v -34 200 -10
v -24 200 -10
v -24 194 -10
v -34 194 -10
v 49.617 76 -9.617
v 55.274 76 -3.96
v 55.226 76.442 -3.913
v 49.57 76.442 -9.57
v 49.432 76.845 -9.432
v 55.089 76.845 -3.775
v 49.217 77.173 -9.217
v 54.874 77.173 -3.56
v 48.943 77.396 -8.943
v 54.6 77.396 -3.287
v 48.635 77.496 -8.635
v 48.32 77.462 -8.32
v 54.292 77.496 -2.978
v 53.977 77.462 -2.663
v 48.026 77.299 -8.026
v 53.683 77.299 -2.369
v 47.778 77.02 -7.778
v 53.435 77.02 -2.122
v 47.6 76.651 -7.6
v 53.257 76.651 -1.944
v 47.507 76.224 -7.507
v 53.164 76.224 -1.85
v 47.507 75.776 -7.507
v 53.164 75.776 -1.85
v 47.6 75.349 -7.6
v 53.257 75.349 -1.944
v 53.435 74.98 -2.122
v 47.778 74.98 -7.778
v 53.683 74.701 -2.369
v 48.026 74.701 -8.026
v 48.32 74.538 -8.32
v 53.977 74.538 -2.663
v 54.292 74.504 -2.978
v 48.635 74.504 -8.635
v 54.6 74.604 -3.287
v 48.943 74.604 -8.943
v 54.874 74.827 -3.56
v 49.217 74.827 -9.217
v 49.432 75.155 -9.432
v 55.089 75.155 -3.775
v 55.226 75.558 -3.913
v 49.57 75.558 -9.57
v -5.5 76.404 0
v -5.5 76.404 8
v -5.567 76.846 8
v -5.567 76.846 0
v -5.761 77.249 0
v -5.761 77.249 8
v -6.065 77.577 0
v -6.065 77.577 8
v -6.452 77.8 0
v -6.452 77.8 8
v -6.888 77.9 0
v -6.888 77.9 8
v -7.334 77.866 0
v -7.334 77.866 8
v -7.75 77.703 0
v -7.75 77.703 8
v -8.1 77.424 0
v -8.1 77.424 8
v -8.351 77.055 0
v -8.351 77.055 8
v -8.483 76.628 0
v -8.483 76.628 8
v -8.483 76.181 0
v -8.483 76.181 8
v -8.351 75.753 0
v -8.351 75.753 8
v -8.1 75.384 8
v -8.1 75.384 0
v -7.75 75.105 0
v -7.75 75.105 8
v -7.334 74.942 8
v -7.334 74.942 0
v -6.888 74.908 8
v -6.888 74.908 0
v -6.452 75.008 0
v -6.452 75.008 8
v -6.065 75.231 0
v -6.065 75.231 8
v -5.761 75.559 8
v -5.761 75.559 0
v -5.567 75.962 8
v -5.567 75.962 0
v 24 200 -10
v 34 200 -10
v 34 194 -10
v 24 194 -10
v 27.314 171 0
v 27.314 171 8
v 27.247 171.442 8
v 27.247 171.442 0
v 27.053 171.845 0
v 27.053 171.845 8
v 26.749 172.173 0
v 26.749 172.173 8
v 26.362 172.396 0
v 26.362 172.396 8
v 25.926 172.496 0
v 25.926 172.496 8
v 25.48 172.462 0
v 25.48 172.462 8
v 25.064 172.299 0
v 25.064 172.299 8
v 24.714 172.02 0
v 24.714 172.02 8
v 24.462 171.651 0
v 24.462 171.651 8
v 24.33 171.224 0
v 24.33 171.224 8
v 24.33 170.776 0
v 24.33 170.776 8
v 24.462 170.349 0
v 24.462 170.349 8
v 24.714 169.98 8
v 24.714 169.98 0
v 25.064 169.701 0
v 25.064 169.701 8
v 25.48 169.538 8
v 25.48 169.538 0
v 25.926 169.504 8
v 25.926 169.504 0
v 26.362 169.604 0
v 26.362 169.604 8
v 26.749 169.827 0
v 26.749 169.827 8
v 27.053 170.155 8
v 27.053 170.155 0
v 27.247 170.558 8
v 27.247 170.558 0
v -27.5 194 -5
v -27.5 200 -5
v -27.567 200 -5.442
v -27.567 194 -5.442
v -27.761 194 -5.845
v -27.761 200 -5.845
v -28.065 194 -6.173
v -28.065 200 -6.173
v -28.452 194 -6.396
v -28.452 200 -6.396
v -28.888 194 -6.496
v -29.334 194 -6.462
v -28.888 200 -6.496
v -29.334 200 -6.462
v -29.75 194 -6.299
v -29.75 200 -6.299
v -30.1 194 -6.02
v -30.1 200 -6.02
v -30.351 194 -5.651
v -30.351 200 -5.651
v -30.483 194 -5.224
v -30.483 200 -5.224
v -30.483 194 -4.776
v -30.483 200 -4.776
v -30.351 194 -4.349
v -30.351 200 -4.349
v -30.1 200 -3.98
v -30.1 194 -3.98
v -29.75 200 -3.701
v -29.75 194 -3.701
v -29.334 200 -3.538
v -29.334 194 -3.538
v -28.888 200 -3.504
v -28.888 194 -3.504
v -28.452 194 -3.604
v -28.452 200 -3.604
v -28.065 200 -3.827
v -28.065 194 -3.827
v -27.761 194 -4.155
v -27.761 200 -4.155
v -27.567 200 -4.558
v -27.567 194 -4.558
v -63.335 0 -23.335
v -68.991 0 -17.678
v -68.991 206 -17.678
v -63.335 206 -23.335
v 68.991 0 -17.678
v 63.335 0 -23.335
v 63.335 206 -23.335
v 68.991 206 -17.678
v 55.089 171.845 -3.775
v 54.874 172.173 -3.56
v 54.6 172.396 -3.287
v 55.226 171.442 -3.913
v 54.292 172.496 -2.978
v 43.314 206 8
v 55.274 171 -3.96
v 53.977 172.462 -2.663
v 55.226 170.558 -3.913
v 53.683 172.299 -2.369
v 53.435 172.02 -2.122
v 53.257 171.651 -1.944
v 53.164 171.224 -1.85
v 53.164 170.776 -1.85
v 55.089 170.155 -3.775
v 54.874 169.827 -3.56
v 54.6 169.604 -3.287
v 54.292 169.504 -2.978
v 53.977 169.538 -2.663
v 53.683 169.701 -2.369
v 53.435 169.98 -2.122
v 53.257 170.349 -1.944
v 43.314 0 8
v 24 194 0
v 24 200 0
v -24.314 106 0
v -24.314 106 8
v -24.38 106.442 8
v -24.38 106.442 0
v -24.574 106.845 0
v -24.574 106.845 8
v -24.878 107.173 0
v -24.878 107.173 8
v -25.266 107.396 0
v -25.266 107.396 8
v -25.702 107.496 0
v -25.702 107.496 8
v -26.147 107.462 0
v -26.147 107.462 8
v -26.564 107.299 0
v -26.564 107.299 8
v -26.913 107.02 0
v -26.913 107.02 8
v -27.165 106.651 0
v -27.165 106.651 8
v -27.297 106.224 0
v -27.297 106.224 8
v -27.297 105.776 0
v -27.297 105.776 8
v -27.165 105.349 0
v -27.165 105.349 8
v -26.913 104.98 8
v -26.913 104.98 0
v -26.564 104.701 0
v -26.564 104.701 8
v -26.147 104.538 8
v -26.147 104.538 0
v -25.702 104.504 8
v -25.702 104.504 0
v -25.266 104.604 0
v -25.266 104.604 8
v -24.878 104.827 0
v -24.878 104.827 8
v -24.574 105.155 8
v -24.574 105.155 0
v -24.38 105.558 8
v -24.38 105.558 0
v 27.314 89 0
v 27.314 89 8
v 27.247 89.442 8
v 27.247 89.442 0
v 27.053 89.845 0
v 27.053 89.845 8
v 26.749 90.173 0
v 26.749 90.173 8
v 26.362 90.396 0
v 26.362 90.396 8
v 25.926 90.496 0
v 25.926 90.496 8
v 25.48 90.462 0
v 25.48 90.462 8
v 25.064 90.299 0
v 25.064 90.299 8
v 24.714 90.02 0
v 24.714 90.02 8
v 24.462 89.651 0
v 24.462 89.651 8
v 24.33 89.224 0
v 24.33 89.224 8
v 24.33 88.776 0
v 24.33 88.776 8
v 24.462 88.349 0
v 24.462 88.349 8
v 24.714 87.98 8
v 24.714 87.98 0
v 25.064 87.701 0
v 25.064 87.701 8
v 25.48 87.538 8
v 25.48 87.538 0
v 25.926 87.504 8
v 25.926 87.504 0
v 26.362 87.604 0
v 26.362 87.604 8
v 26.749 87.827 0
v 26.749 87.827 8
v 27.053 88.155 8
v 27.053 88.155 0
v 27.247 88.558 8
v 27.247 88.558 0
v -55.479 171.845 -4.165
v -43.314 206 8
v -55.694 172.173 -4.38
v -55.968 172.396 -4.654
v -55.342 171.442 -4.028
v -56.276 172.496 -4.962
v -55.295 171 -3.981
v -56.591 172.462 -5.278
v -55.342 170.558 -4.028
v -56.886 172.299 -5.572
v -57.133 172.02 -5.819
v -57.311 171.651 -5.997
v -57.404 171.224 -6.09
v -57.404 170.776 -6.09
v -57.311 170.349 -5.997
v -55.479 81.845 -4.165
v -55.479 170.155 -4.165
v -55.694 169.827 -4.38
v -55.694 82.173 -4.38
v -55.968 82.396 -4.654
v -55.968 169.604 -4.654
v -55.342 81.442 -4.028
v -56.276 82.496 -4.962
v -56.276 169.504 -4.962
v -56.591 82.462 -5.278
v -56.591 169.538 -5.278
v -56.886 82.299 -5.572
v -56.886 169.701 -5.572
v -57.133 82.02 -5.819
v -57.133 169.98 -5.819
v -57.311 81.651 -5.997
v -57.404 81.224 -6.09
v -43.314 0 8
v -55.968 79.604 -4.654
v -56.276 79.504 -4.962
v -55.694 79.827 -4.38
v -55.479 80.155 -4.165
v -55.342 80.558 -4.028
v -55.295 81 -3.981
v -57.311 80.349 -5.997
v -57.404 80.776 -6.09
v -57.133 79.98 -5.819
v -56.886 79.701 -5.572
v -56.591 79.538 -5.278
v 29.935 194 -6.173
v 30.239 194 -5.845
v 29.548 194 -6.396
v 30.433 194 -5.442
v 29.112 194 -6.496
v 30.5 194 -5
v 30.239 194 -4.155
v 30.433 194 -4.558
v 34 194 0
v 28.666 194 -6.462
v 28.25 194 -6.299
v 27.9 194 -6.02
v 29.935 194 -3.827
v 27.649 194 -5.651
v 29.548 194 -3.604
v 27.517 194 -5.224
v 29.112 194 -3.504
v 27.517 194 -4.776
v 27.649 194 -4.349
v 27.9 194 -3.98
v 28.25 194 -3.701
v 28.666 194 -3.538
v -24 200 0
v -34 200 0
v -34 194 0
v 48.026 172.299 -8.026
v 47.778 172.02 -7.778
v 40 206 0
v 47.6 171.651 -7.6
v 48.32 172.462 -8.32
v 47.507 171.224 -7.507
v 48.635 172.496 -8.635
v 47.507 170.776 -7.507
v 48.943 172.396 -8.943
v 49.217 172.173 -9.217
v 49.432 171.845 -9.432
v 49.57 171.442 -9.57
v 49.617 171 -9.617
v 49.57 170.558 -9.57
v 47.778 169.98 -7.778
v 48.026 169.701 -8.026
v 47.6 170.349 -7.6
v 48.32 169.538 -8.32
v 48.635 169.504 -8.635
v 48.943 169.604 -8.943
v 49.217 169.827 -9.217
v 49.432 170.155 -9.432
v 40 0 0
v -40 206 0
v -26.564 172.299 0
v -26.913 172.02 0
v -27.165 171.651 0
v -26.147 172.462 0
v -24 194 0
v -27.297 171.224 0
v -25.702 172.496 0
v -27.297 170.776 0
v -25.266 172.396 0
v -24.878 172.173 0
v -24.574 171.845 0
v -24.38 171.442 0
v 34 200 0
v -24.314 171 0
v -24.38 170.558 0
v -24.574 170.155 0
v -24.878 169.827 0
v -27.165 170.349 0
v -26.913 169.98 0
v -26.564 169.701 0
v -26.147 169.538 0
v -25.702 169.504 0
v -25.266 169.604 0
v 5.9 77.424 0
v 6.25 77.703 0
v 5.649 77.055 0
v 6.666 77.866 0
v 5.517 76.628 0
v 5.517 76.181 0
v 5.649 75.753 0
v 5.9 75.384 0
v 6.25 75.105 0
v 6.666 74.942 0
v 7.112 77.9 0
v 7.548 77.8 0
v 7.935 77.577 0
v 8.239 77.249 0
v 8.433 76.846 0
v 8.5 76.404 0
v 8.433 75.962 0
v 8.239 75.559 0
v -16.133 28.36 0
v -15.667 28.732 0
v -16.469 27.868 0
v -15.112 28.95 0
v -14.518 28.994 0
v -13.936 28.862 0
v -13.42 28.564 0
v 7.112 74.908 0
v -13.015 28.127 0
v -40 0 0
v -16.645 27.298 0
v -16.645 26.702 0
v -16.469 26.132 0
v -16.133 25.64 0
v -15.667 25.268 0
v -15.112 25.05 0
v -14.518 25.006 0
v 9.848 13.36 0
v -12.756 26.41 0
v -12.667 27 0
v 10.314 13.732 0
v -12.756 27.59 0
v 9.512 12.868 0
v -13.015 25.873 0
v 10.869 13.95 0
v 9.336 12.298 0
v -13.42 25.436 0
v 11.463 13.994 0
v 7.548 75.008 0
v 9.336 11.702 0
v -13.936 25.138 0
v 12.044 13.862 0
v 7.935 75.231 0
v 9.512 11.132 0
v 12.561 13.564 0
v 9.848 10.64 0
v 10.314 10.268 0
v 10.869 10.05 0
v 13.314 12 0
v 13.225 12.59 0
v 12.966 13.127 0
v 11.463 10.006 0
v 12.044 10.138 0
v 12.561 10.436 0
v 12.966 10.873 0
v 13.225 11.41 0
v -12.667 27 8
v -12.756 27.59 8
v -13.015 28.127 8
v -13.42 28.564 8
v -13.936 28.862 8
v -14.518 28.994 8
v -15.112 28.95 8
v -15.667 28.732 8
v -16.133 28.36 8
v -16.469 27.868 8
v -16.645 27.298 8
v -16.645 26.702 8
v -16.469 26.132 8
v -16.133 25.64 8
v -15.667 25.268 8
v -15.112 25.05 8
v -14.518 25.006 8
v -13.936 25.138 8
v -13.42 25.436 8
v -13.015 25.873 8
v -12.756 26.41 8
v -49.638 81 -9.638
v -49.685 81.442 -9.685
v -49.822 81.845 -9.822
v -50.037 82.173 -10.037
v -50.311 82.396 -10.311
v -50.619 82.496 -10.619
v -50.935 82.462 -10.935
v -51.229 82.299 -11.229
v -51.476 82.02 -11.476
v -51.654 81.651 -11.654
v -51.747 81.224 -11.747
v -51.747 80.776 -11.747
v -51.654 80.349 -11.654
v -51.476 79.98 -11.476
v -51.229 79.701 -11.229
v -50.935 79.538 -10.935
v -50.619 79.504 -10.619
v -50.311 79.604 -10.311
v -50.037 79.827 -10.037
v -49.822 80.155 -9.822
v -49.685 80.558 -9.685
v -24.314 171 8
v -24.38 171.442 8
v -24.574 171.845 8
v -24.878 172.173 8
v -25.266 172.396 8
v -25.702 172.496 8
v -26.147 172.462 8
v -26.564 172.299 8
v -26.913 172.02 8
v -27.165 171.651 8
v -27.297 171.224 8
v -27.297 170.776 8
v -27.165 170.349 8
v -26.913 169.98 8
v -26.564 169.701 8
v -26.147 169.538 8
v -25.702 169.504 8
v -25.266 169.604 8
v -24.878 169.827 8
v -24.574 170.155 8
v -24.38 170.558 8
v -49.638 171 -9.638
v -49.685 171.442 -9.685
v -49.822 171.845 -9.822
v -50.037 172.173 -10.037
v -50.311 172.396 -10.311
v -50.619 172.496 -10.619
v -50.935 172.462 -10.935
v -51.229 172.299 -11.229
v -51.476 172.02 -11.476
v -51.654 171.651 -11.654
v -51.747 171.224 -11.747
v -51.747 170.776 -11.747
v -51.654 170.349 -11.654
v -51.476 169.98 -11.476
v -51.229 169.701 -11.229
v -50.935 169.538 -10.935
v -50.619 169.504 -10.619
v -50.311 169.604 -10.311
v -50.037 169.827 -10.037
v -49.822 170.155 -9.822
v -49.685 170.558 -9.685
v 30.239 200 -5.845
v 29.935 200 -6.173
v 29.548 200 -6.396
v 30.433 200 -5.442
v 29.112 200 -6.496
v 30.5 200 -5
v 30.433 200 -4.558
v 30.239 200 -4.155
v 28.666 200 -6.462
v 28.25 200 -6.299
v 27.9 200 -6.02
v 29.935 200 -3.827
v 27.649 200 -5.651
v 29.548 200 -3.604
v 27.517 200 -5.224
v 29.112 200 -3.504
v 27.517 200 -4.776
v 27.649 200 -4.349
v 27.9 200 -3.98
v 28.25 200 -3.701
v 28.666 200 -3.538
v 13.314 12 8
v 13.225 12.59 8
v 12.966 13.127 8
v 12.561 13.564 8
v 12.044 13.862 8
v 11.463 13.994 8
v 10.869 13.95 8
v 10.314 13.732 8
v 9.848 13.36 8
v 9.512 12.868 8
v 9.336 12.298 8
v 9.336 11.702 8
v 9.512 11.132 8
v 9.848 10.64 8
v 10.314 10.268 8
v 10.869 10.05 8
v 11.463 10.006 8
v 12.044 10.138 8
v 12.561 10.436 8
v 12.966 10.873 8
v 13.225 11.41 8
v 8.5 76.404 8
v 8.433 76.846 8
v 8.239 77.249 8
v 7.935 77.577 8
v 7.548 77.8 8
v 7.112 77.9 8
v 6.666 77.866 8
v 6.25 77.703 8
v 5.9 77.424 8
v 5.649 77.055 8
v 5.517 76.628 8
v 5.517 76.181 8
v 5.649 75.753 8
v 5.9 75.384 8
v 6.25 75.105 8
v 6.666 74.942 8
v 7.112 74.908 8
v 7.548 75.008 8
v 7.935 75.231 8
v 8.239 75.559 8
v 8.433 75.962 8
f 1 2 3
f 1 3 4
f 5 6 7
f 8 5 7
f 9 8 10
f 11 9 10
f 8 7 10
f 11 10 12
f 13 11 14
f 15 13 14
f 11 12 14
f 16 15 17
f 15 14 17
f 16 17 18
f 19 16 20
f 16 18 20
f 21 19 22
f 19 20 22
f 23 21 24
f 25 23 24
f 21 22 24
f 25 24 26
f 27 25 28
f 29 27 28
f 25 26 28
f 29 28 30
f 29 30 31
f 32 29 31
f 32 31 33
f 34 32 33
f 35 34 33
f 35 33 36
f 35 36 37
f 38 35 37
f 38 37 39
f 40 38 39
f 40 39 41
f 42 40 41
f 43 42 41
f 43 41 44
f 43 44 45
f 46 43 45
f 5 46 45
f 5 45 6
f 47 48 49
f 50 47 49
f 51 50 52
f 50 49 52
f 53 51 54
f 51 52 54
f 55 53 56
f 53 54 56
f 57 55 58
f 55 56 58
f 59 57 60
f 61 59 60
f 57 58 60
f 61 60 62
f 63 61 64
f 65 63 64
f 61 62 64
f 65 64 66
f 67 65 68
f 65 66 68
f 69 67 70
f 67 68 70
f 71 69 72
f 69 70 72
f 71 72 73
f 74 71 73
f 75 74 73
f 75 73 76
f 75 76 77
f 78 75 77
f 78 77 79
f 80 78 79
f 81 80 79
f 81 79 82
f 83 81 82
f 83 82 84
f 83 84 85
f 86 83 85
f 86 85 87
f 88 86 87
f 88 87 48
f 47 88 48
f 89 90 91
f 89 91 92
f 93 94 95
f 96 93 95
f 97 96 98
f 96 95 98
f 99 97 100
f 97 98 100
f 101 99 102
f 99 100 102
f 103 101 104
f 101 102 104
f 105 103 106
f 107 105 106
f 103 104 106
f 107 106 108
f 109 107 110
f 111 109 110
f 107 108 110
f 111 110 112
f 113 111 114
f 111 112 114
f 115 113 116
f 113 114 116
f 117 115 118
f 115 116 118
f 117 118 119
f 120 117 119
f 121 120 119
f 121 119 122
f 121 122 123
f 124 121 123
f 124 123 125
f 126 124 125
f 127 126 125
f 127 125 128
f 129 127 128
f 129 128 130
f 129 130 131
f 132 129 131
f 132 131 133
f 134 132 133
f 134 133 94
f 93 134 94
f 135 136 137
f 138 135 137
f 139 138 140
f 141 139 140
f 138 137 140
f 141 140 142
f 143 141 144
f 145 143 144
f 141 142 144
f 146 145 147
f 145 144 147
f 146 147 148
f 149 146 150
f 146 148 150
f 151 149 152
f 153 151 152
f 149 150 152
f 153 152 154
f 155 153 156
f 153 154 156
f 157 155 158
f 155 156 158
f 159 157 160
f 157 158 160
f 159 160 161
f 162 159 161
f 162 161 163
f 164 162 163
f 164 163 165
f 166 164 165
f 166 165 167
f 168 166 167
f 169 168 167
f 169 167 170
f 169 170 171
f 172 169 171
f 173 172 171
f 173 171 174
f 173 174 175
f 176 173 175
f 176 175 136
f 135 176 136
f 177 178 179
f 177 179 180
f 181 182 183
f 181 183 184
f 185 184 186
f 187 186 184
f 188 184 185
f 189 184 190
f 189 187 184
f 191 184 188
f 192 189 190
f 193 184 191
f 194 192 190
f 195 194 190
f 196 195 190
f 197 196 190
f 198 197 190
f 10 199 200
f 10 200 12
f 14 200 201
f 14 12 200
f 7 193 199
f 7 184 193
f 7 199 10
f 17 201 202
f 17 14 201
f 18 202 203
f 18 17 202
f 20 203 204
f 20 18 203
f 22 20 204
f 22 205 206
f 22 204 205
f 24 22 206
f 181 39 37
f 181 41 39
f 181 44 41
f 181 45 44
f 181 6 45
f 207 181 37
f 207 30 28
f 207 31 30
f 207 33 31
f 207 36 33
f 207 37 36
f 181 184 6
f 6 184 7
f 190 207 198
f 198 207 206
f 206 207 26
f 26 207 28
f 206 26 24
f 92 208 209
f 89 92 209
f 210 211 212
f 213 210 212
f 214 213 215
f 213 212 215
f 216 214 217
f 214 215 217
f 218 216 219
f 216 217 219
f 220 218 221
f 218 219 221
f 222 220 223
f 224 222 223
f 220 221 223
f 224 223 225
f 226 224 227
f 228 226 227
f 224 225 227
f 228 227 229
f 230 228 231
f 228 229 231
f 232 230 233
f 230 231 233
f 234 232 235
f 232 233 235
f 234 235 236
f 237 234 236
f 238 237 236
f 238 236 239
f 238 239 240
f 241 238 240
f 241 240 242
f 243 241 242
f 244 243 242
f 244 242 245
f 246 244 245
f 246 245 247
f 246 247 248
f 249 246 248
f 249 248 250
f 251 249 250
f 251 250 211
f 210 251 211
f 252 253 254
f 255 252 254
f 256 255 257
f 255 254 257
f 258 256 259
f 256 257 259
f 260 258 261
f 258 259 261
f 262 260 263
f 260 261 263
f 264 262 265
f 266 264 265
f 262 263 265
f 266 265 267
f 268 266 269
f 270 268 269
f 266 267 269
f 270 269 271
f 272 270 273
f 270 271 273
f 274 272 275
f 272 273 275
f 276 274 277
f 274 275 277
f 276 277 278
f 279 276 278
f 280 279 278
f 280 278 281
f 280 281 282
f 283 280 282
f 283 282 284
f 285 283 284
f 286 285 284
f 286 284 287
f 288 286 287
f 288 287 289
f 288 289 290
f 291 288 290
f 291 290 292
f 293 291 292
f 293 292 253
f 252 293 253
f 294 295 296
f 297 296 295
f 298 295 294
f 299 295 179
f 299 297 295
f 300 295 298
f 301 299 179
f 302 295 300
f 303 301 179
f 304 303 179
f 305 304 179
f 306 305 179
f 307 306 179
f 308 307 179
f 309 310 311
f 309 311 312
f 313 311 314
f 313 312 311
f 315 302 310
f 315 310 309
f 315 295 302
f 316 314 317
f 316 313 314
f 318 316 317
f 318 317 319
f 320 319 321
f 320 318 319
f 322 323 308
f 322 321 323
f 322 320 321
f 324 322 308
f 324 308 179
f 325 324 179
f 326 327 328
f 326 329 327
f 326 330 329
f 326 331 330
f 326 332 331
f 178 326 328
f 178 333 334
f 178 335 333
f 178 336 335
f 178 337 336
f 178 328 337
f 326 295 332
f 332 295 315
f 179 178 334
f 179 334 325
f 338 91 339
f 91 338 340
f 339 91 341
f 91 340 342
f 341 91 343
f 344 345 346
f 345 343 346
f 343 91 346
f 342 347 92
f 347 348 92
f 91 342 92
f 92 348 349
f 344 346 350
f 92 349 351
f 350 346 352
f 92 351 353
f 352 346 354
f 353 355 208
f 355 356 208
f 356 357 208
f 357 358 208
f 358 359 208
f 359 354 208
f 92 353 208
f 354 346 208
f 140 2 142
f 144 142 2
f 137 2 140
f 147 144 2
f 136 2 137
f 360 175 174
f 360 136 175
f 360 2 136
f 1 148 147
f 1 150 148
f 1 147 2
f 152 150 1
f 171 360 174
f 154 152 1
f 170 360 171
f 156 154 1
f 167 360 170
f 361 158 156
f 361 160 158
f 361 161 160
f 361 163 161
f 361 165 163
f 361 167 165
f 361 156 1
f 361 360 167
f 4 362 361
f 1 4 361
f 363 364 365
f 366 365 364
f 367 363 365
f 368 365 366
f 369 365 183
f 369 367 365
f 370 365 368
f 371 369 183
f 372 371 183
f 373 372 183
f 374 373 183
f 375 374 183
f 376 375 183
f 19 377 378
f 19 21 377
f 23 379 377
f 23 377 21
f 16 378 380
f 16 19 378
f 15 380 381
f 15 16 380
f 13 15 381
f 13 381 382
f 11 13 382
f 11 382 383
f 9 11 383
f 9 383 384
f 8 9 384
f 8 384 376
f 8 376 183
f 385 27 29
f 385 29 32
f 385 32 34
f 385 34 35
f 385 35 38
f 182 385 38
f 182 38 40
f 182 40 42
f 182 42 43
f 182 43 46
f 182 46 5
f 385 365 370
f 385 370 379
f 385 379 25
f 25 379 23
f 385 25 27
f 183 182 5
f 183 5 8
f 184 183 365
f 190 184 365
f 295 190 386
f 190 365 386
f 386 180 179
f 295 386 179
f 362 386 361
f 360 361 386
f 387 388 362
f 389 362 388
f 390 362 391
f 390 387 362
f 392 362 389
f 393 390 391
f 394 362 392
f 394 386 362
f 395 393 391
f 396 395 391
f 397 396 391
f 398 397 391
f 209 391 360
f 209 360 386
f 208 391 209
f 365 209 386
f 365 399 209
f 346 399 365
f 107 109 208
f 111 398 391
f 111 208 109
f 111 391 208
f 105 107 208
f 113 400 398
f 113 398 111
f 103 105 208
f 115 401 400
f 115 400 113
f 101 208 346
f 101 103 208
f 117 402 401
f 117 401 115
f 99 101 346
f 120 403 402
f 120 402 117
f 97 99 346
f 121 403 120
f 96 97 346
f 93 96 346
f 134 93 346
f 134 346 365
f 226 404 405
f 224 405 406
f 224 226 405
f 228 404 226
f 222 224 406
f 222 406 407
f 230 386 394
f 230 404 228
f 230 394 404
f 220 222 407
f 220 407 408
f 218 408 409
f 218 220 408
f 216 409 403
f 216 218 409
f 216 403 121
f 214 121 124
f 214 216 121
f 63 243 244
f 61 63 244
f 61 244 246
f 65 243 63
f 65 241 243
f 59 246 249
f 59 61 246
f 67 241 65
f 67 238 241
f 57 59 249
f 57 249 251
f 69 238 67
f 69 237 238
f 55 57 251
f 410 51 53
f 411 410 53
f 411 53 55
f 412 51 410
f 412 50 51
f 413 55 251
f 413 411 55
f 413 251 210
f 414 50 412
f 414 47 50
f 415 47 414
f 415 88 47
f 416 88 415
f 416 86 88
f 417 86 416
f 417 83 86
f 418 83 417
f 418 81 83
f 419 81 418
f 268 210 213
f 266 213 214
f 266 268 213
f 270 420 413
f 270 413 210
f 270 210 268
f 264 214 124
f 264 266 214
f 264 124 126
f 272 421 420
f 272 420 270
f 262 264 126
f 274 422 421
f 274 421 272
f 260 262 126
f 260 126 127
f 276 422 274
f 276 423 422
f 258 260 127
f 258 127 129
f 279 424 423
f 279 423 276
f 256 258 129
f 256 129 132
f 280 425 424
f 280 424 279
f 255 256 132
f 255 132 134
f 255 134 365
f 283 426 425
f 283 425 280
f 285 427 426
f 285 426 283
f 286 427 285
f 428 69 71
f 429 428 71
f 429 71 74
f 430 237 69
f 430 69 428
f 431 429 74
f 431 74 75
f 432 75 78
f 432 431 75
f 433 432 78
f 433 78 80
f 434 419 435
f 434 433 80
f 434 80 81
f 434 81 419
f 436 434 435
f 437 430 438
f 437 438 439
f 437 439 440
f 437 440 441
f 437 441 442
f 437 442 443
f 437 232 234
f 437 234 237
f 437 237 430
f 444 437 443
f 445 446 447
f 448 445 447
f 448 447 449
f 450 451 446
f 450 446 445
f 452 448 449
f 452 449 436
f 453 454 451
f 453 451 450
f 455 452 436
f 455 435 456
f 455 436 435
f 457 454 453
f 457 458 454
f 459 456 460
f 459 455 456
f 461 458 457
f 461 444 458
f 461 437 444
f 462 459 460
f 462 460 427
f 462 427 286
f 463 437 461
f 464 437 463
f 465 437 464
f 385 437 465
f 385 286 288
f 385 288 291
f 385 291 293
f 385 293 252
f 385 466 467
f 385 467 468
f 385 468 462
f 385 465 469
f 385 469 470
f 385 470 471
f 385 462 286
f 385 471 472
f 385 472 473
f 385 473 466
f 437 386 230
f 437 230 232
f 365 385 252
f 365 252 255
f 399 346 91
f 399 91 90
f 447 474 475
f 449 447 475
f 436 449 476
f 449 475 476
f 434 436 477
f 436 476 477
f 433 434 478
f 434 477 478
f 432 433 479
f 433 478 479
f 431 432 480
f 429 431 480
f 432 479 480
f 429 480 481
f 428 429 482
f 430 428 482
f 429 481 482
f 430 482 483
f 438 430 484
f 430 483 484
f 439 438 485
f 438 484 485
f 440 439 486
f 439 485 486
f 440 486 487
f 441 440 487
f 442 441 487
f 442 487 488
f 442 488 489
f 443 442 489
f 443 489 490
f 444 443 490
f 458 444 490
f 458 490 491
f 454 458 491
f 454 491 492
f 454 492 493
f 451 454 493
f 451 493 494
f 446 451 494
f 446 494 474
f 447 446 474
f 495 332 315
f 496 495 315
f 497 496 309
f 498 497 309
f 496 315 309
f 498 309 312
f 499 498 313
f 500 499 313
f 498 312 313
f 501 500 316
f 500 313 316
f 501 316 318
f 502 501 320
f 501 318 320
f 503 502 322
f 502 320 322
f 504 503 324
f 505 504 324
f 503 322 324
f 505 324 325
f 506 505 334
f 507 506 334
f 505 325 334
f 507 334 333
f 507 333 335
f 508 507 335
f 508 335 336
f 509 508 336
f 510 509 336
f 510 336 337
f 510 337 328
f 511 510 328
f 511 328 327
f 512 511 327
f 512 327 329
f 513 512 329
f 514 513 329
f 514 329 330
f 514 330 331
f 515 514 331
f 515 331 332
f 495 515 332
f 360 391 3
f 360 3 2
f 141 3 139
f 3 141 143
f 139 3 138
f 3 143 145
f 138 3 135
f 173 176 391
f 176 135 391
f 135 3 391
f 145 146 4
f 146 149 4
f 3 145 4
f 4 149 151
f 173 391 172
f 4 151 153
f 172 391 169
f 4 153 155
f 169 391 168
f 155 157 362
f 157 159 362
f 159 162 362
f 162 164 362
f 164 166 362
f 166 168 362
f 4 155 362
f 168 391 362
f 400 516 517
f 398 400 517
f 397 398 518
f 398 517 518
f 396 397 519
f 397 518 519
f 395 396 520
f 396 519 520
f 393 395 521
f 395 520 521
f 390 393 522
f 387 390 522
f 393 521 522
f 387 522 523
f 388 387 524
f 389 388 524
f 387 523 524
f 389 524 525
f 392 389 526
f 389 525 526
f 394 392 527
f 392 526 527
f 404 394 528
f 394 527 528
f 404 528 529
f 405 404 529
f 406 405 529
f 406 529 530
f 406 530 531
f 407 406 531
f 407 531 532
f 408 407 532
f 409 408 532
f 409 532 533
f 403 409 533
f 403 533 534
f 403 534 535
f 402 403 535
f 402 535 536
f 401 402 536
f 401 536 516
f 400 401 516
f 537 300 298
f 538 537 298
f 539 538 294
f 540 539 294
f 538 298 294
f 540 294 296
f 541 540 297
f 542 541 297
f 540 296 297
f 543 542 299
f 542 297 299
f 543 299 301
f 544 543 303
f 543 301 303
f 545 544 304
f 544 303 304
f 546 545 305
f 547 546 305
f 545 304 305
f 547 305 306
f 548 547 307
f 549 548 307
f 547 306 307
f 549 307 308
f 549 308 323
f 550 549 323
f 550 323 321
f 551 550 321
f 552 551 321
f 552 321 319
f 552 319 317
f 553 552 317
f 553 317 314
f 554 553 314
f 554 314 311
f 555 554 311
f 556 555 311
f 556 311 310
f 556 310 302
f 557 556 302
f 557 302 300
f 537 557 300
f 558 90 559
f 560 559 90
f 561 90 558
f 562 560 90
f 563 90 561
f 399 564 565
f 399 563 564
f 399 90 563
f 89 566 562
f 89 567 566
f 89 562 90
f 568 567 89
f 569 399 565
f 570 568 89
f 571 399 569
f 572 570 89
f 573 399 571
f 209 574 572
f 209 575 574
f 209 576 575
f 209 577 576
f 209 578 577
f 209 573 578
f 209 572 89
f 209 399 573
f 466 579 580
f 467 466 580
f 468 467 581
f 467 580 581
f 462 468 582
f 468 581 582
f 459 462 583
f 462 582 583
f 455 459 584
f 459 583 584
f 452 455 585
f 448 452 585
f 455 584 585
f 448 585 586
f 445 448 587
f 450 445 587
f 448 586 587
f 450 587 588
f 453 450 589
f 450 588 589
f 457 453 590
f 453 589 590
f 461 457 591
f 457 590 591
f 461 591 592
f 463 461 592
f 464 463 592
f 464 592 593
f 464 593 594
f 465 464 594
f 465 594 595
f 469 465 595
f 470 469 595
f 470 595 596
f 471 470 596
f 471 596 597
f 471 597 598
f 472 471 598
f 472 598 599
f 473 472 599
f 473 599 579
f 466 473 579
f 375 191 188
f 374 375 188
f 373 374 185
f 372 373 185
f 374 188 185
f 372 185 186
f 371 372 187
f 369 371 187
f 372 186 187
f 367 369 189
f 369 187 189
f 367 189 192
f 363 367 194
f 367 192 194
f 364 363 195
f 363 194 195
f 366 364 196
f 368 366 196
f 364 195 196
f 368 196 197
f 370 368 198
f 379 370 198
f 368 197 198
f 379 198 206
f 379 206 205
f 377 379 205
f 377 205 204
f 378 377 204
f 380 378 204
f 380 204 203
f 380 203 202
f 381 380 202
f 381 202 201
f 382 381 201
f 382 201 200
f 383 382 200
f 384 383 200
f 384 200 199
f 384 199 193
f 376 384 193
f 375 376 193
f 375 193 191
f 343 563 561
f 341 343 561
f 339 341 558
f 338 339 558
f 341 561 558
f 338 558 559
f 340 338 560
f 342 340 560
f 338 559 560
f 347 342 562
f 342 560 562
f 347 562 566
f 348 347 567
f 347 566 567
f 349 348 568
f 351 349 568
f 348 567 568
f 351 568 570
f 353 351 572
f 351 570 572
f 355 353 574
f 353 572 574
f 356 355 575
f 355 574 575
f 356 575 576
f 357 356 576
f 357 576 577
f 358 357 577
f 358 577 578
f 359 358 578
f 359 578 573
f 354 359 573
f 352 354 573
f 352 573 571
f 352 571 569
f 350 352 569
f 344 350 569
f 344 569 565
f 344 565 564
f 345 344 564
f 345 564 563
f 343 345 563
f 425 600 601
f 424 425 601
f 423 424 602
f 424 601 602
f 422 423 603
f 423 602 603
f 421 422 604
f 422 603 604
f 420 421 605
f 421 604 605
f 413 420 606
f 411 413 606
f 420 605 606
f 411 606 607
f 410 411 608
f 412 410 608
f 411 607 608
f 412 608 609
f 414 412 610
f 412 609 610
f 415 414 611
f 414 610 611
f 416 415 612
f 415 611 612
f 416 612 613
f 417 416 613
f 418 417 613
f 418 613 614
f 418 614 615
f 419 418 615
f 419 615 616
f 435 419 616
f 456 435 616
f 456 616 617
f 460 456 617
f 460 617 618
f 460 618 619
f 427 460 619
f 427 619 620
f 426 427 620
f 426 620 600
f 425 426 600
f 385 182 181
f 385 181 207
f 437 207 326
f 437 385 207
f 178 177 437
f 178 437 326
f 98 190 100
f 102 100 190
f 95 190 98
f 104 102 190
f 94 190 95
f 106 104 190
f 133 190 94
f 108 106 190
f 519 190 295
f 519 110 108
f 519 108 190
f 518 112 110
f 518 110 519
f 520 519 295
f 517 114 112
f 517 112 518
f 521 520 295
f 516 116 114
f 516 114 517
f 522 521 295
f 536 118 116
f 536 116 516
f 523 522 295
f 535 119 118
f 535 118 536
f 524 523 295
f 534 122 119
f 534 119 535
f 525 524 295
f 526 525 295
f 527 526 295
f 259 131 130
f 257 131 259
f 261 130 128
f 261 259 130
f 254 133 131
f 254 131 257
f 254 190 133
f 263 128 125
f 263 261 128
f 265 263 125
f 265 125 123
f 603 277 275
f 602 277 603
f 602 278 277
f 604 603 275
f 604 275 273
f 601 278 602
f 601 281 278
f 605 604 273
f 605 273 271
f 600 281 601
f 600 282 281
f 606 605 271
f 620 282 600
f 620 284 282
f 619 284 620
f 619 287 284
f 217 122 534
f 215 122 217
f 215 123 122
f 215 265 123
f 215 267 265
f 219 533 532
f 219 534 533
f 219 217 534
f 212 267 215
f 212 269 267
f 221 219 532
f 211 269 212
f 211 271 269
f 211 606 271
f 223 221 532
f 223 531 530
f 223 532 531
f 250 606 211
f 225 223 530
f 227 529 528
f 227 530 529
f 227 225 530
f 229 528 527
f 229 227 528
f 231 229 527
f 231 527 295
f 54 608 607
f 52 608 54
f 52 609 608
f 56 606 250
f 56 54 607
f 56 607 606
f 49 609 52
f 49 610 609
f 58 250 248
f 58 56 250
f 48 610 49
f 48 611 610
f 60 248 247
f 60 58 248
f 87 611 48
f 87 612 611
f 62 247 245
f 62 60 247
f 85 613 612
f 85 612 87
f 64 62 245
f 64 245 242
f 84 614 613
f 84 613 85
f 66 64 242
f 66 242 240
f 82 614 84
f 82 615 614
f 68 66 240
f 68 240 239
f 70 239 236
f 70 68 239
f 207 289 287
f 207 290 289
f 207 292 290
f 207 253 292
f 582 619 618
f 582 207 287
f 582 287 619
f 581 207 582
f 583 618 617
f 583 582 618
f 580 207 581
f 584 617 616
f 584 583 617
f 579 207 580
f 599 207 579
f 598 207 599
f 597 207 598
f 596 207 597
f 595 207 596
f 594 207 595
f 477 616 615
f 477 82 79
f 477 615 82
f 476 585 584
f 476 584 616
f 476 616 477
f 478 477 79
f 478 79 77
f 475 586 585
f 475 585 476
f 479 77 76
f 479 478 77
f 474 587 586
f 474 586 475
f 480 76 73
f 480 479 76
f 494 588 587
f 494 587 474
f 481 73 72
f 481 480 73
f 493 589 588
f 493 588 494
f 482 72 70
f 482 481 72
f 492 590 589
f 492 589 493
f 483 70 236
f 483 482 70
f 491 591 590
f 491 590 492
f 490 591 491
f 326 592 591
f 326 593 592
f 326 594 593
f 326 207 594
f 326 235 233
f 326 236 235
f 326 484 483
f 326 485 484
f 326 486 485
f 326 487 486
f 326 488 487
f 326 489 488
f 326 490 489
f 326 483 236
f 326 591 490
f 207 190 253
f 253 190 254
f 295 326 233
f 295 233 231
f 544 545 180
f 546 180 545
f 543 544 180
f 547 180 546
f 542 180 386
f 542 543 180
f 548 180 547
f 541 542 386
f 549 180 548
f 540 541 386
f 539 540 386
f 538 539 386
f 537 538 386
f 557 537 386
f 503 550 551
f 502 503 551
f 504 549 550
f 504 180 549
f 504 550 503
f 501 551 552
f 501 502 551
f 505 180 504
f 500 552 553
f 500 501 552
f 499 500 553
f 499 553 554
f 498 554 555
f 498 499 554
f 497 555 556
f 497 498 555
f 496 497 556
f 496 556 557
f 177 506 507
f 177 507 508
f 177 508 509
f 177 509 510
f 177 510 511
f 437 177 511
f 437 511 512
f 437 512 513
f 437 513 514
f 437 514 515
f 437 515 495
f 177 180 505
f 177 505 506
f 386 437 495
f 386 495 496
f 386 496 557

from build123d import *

# Parameters (mm, degrees)
BOSS_EXTRUDE1_DEPTH = 206
SKETCH2_W           = 10
SKETCH2_H           = 6
BOSS_EXTRUDE2_DEPTH = 10
CUT_EXTRUDE1_REACH  = 202
SKETCH3_R           = 1.5
CUT_EXTRUDE2_REACH  = 33.335
SKETCH4_R           = 2
CUT_EXTRUDE3_REACH  = 33.335
SKETCH5_R           = 1.5
CUT_EXTRUDE4_REACH  = 33.335
SKETCH6_R           = 1.5
CUT_EXTRUDE5_REACH  = 103.569
SKETCH7_R           = 1.5
CUT_EXTRUDE6_REACH  = 103.569
SKETCH8_R           = 1.5


with BuildPart() as part:
    # Sketch1 → Boss-Extrude1 (new body)
    with BuildSketch(Plane(origin=(0, 0, 0), x_dir=(1, 0, 0), z_dir=(0, 1, 0))):
        Polygon((-40, 0), (40, 0), (63.334523779, 23.334523779), (68.991378029, 17.67766953), (43.313708499, -8), (-43.313708499, -8), (-68.991378029, 17.67766953), (-63.334523779, 23.334523779), align=None)
    extrude(amount=BOSS_EXTRUDE1_DEPTH)

    # Sketch2 → Boss-Extrude2 (add)
    with BuildSketch(Plane(origin=(0, 0, 0), x_dir=(-1, 0, 0), z_dir=(0, 0, -1))):
        with Locations((-29, 197)):
            Rectangle(SKETCH2_W, SKETCH2_H)
        with Locations((29, 197)):
            Rectangle(SKETCH2_W, SKETCH2_H)
    extrude(amount=BOSS_EXTRUDE2_DEPTH)

    # Sketch3 → Cut-Extrude1 (cut, up to next)
    with BuildSketch(Plane(origin=(0, 200, 0), x_dir=(1, 0, 0), z_dir=(0, 1, 0)), mode=Mode.PRIVATE) as cut_extrude1_sk1:
        with Locations((-29, 5)):
            Circle(SKETCH3_R)
    cut_extrude1_tool1 = extrude(cut_extrude1_sk1.sketch, amount=-CUT_EXTRUDE1_REACH, mode=Mode.PRIVATE) & part.part
    add(cut_extrude1_tool1.solids().sort_by_distance((-29, 200, -5))[0], mode=Mode.SUBTRACT)
    # Sketch3 → Cut-Extrude1 (cut, up to next)
    with BuildSketch(Plane(origin=(0, 200, 0), x_dir=(1, 0, 0), z_dir=(0, 1, 0)), mode=Mode.PRIVATE) as cut_extrude1_sk2:
        with Locations((29, 5)):
            Circle(SKETCH3_R)
    cut_extrude1_tool2 = extrude(cut_extrude1_sk2.sketch, amount=-CUT_EXTRUDE1_REACH, mode=Mode.PRIVATE) & part.part
    add(cut_extrude1_tool2.solids().sort_by_distance((29, 200, -5))[0], mode=Mode.SUBTRACT)

    # Sketch4 → Cut-Extrude2 (cut, up to next)
    with BuildSketch(Plane.XY.offset(8), mode=Mode.PRIVATE) as cut_extrude2_sk1:
        with Locations((-14.667053615, 27)):
            Circle(SKETCH4_R)
    cut_extrude2_tool1 = extrude(cut_extrude2_sk1.sketch, amount=-CUT_EXTRUDE2_REACH, mode=Mode.PRIVATE) & part.part
    add(cut_extrude2_tool1.solids().sort_by_distance((-14.667054, 27, 8))[0], mode=Mode.SUBTRACT)
    # Sketch4 → Cut-Extrude2 (cut, up to next)
    with BuildSketch(Plane.XY.offset(8), mode=Mode.PRIVATE) as cut_extrude2_sk2:
        with Locations((11.313708499, 12)):
            Circle(SKETCH4_R)
    cut_extrude2_tool2 = extrude(cut_extrude2_sk2.sketch, amount=-CUT_EXTRUDE2_REACH, mode=Mode.PRIVATE) & part.part
    add(cut_extrude2_tool2.solids().sort_by_distance((11.313708, 12, 8))[0], mode=Mode.SUBTRACT)

    # Sketch5 → Cut-Extrude3 (cut, up to next)
    with BuildSketch(Plane.XY.offset(8), mode=Mode.PRIVATE) as cut_extrude3_sk1:
        with Locations((-7, 76.404082058)):
            Circle(SKETCH5_R)
    cut_extrude3_tool1 = extrude(cut_extrude3_sk1.sketch, amount=-CUT_EXTRUDE3_REACH, mode=Mode.PRIVATE) & part.part
    add(cut_extrude3_tool1.solids().sort_by_distance((-7, 76.404082, 8))[0], mode=Mode.SUBTRACT)
    # Sketch5 → Cut-Extrude3 (cut, up to next)
    with BuildSketch(Plane.XY.offset(8), mode=Mode.PRIVATE) as cut_extrude3_sk2:
        with Locations((7, 76.404082058)):
            Circle(SKETCH5_R)
    cut_extrude3_tool2 = extrude(cut_extrude3_sk2.sketch, amount=-CUT_EXTRUDE3_REACH, mode=Mode.PRIVATE) & part.part
    add(cut_extrude3_tool2.solids().sort_by_distance((7, 76.404082, 8))[0], mode=Mode.SUBTRACT)

    # Sketch6 → Cut-Extrude4 (cut, up to next)
    with BuildSketch(Plane.XY.offset(8), mode=Mode.PRIVATE) as cut_extrude4_sk1:
        with Locations((-25.813708499, 171)):
            Circle(SKETCH6_R)
    cut_extrude4_tool1 = extrude(cut_extrude4_sk1.sketch, amount=-CUT_EXTRUDE4_REACH, mode=Mode.PRIVATE) & part.part
    add(cut_extrude4_tool1.solids().sort_by_distance((-25.813708, 171, 8))[0], mode=Mode.SUBTRACT)
    # Sketch6 → Cut-Extrude4 (cut, up to next)
    with BuildSketch(Plane.XY.offset(8), mode=Mode.PRIVATE) as cut_extrude4_sk2:
        with Locations((25.813708499, 171)):
            Circle(SKETCH6_R)
    cut_extrude4_tool2 = extrude(cut_extrude4_sk2.sketch, amount=-CUT_EXTRUDE4_REACH, mode=Mode.PRIVATE) & part.part
    add(cut_extrude4_tool2.solids().sort_by_distance((25.813708, 171, 8))[0], mode=Mode.SUBTRACT)
    # Sketch6 → Cut-Extrude4 (cut, up to next)
    with BuildSketch(Plane.XY.offset(8), mode=Mode.PRIVATE) as cut_extrude4_sk3:
        with Locations((-25.813708499, 106)):
            Circle(SKETCH6_R)
    cut_extrude4_tool3 = extrude(cut_extrude4_sk3.sketch, amount=-CUT_EXTRUDE4_REACH, mode=Mode.PRIVATE) & part.part
    add(cut_extrude4_tool3.solids().sort_by_distance((-25.813708, 106, 8))[0], mode=Mode.SUBTRACT)
    # Sketch6 → Cut-Extrude4 (cut, up to next)
    with BuildSketch(Plane.XY.offset(8), mode=Mode.PRIVATE) as cut_extrude4_sk4:
        with Locations((25.813708499, 89)):
            Circle(SKETCH6_R)
    cut_extrude4_tool4 = extrude(cut_extrude4_sk4.sketch, amount=-CUT_EXTRUDE4_REACH, mode=Mode.PRIVATE) & part.part
    add(cut_extrude4_tool4.solids().sort_by_distance((25.813708, 89, 8))[0], mode=Mode.SUBTRACT)

    # Sketch7 → Cut-Extrude5 (cut, up to next)
    with BuildSketch(Plane(origin=(-25.656854249, 0, 25.656854249), x_dir=(0.707106781, 0, 0.707106781), z_dir=(-0.707106781, 0, 0.707106781)), mode=Mode.PRIVATE) as cut_extrude5_sk1:
        with Locations((-43.414271247, 171)):
            Circle(SKETCH7_R)
    cut_extrude5_tool1 = extrude(cut_extrude5_sk1.sketch, amount=-CUT_EXTRUDE5_REACH, mode=Mode.PRIVATE) & part.part
    add(cut_extrude5_tool1.solids().sort_by_distance((-56.35538, 171, -5.041671))[0], mode=Mode.SUBTRACT)
    # Sketch7 → Cut-Extrude5 (cut, up to next)
    with BuildSketch(Plane(origin=(-25.656854249, 0, 25.656854249), x_dir=(0.707106781, 0, 0.707106781), z_dir=(-0.707106781, 0, 0.707106781)), mode=Mode.PRIVATE) as cut_extrude5_sk2:
        with Locations((-43.414271247, 81)):
            Circle(SKETCH7_R)
    cut_extrude5_tool2 = extrude(cut_extrude5_sk2.sketch, amount=-CUT_EXTRUDE5_REACH, mode=Mode.PRIVATE) & part.part
    add(cut_extrude5_tool2.solids().sort_by_distance((-56.35538, 81, -5.041671))[0], mode=Mode.SUBTRACT)

    # Sketch8 → Cut-Extrude6 (cut, up to next)
    with BuildSketch(Plane(origin=(25.656854249, 0, 25.656854249), x_dir=(0.707106781, 0, -0.707106781), z_dir=(0.707106781, 0, 0.707106781)), mode=Mode.PRIVATE) as cut_extrude6_sk1:
        with Locations((40.384271247, 171)):
            Circle(SKETCH8_R)
    cut_extrude6_tool1 = extrude(cut_extrude6_sk1.sketch, amount=-CUT_EXTRUDE6_REACH, mode=Mode.PRIVATE) & part.part
    add(cut_extrude6_tool1.solids().sort_by_distance((54.212846, 171, -2.899138))[0], mode=Mode.SUBTRACT)
    # Sketch8 → Cut-Extrude6 (cut, up to next)
    with BuildSketch(Plane(origin=(25.656854249, 0, 25.656854249), x_dir=(0.707106781, 0, -0.707106781), z_dir=(0.707106781, 0, 0.707106781)), mode=Mode.PRIVATE) as cut_extrude6_sk2:
        with Locations((40.384271247, 76)):
            Circle(SKETCH8_R)
    cut_extrude6_tool2 = extrude(cut_extrude6_sk2.sketch, amount=-CUT_EXTRUDE6_REACH, mode=Mode.PRIVATE) & part.part
    add(cut_extrude6_tool2.solids().sort_by_distance((54.212846, 76, -2.899138))[0], mode=Mode.SUBTRACT)


solid = part.part
